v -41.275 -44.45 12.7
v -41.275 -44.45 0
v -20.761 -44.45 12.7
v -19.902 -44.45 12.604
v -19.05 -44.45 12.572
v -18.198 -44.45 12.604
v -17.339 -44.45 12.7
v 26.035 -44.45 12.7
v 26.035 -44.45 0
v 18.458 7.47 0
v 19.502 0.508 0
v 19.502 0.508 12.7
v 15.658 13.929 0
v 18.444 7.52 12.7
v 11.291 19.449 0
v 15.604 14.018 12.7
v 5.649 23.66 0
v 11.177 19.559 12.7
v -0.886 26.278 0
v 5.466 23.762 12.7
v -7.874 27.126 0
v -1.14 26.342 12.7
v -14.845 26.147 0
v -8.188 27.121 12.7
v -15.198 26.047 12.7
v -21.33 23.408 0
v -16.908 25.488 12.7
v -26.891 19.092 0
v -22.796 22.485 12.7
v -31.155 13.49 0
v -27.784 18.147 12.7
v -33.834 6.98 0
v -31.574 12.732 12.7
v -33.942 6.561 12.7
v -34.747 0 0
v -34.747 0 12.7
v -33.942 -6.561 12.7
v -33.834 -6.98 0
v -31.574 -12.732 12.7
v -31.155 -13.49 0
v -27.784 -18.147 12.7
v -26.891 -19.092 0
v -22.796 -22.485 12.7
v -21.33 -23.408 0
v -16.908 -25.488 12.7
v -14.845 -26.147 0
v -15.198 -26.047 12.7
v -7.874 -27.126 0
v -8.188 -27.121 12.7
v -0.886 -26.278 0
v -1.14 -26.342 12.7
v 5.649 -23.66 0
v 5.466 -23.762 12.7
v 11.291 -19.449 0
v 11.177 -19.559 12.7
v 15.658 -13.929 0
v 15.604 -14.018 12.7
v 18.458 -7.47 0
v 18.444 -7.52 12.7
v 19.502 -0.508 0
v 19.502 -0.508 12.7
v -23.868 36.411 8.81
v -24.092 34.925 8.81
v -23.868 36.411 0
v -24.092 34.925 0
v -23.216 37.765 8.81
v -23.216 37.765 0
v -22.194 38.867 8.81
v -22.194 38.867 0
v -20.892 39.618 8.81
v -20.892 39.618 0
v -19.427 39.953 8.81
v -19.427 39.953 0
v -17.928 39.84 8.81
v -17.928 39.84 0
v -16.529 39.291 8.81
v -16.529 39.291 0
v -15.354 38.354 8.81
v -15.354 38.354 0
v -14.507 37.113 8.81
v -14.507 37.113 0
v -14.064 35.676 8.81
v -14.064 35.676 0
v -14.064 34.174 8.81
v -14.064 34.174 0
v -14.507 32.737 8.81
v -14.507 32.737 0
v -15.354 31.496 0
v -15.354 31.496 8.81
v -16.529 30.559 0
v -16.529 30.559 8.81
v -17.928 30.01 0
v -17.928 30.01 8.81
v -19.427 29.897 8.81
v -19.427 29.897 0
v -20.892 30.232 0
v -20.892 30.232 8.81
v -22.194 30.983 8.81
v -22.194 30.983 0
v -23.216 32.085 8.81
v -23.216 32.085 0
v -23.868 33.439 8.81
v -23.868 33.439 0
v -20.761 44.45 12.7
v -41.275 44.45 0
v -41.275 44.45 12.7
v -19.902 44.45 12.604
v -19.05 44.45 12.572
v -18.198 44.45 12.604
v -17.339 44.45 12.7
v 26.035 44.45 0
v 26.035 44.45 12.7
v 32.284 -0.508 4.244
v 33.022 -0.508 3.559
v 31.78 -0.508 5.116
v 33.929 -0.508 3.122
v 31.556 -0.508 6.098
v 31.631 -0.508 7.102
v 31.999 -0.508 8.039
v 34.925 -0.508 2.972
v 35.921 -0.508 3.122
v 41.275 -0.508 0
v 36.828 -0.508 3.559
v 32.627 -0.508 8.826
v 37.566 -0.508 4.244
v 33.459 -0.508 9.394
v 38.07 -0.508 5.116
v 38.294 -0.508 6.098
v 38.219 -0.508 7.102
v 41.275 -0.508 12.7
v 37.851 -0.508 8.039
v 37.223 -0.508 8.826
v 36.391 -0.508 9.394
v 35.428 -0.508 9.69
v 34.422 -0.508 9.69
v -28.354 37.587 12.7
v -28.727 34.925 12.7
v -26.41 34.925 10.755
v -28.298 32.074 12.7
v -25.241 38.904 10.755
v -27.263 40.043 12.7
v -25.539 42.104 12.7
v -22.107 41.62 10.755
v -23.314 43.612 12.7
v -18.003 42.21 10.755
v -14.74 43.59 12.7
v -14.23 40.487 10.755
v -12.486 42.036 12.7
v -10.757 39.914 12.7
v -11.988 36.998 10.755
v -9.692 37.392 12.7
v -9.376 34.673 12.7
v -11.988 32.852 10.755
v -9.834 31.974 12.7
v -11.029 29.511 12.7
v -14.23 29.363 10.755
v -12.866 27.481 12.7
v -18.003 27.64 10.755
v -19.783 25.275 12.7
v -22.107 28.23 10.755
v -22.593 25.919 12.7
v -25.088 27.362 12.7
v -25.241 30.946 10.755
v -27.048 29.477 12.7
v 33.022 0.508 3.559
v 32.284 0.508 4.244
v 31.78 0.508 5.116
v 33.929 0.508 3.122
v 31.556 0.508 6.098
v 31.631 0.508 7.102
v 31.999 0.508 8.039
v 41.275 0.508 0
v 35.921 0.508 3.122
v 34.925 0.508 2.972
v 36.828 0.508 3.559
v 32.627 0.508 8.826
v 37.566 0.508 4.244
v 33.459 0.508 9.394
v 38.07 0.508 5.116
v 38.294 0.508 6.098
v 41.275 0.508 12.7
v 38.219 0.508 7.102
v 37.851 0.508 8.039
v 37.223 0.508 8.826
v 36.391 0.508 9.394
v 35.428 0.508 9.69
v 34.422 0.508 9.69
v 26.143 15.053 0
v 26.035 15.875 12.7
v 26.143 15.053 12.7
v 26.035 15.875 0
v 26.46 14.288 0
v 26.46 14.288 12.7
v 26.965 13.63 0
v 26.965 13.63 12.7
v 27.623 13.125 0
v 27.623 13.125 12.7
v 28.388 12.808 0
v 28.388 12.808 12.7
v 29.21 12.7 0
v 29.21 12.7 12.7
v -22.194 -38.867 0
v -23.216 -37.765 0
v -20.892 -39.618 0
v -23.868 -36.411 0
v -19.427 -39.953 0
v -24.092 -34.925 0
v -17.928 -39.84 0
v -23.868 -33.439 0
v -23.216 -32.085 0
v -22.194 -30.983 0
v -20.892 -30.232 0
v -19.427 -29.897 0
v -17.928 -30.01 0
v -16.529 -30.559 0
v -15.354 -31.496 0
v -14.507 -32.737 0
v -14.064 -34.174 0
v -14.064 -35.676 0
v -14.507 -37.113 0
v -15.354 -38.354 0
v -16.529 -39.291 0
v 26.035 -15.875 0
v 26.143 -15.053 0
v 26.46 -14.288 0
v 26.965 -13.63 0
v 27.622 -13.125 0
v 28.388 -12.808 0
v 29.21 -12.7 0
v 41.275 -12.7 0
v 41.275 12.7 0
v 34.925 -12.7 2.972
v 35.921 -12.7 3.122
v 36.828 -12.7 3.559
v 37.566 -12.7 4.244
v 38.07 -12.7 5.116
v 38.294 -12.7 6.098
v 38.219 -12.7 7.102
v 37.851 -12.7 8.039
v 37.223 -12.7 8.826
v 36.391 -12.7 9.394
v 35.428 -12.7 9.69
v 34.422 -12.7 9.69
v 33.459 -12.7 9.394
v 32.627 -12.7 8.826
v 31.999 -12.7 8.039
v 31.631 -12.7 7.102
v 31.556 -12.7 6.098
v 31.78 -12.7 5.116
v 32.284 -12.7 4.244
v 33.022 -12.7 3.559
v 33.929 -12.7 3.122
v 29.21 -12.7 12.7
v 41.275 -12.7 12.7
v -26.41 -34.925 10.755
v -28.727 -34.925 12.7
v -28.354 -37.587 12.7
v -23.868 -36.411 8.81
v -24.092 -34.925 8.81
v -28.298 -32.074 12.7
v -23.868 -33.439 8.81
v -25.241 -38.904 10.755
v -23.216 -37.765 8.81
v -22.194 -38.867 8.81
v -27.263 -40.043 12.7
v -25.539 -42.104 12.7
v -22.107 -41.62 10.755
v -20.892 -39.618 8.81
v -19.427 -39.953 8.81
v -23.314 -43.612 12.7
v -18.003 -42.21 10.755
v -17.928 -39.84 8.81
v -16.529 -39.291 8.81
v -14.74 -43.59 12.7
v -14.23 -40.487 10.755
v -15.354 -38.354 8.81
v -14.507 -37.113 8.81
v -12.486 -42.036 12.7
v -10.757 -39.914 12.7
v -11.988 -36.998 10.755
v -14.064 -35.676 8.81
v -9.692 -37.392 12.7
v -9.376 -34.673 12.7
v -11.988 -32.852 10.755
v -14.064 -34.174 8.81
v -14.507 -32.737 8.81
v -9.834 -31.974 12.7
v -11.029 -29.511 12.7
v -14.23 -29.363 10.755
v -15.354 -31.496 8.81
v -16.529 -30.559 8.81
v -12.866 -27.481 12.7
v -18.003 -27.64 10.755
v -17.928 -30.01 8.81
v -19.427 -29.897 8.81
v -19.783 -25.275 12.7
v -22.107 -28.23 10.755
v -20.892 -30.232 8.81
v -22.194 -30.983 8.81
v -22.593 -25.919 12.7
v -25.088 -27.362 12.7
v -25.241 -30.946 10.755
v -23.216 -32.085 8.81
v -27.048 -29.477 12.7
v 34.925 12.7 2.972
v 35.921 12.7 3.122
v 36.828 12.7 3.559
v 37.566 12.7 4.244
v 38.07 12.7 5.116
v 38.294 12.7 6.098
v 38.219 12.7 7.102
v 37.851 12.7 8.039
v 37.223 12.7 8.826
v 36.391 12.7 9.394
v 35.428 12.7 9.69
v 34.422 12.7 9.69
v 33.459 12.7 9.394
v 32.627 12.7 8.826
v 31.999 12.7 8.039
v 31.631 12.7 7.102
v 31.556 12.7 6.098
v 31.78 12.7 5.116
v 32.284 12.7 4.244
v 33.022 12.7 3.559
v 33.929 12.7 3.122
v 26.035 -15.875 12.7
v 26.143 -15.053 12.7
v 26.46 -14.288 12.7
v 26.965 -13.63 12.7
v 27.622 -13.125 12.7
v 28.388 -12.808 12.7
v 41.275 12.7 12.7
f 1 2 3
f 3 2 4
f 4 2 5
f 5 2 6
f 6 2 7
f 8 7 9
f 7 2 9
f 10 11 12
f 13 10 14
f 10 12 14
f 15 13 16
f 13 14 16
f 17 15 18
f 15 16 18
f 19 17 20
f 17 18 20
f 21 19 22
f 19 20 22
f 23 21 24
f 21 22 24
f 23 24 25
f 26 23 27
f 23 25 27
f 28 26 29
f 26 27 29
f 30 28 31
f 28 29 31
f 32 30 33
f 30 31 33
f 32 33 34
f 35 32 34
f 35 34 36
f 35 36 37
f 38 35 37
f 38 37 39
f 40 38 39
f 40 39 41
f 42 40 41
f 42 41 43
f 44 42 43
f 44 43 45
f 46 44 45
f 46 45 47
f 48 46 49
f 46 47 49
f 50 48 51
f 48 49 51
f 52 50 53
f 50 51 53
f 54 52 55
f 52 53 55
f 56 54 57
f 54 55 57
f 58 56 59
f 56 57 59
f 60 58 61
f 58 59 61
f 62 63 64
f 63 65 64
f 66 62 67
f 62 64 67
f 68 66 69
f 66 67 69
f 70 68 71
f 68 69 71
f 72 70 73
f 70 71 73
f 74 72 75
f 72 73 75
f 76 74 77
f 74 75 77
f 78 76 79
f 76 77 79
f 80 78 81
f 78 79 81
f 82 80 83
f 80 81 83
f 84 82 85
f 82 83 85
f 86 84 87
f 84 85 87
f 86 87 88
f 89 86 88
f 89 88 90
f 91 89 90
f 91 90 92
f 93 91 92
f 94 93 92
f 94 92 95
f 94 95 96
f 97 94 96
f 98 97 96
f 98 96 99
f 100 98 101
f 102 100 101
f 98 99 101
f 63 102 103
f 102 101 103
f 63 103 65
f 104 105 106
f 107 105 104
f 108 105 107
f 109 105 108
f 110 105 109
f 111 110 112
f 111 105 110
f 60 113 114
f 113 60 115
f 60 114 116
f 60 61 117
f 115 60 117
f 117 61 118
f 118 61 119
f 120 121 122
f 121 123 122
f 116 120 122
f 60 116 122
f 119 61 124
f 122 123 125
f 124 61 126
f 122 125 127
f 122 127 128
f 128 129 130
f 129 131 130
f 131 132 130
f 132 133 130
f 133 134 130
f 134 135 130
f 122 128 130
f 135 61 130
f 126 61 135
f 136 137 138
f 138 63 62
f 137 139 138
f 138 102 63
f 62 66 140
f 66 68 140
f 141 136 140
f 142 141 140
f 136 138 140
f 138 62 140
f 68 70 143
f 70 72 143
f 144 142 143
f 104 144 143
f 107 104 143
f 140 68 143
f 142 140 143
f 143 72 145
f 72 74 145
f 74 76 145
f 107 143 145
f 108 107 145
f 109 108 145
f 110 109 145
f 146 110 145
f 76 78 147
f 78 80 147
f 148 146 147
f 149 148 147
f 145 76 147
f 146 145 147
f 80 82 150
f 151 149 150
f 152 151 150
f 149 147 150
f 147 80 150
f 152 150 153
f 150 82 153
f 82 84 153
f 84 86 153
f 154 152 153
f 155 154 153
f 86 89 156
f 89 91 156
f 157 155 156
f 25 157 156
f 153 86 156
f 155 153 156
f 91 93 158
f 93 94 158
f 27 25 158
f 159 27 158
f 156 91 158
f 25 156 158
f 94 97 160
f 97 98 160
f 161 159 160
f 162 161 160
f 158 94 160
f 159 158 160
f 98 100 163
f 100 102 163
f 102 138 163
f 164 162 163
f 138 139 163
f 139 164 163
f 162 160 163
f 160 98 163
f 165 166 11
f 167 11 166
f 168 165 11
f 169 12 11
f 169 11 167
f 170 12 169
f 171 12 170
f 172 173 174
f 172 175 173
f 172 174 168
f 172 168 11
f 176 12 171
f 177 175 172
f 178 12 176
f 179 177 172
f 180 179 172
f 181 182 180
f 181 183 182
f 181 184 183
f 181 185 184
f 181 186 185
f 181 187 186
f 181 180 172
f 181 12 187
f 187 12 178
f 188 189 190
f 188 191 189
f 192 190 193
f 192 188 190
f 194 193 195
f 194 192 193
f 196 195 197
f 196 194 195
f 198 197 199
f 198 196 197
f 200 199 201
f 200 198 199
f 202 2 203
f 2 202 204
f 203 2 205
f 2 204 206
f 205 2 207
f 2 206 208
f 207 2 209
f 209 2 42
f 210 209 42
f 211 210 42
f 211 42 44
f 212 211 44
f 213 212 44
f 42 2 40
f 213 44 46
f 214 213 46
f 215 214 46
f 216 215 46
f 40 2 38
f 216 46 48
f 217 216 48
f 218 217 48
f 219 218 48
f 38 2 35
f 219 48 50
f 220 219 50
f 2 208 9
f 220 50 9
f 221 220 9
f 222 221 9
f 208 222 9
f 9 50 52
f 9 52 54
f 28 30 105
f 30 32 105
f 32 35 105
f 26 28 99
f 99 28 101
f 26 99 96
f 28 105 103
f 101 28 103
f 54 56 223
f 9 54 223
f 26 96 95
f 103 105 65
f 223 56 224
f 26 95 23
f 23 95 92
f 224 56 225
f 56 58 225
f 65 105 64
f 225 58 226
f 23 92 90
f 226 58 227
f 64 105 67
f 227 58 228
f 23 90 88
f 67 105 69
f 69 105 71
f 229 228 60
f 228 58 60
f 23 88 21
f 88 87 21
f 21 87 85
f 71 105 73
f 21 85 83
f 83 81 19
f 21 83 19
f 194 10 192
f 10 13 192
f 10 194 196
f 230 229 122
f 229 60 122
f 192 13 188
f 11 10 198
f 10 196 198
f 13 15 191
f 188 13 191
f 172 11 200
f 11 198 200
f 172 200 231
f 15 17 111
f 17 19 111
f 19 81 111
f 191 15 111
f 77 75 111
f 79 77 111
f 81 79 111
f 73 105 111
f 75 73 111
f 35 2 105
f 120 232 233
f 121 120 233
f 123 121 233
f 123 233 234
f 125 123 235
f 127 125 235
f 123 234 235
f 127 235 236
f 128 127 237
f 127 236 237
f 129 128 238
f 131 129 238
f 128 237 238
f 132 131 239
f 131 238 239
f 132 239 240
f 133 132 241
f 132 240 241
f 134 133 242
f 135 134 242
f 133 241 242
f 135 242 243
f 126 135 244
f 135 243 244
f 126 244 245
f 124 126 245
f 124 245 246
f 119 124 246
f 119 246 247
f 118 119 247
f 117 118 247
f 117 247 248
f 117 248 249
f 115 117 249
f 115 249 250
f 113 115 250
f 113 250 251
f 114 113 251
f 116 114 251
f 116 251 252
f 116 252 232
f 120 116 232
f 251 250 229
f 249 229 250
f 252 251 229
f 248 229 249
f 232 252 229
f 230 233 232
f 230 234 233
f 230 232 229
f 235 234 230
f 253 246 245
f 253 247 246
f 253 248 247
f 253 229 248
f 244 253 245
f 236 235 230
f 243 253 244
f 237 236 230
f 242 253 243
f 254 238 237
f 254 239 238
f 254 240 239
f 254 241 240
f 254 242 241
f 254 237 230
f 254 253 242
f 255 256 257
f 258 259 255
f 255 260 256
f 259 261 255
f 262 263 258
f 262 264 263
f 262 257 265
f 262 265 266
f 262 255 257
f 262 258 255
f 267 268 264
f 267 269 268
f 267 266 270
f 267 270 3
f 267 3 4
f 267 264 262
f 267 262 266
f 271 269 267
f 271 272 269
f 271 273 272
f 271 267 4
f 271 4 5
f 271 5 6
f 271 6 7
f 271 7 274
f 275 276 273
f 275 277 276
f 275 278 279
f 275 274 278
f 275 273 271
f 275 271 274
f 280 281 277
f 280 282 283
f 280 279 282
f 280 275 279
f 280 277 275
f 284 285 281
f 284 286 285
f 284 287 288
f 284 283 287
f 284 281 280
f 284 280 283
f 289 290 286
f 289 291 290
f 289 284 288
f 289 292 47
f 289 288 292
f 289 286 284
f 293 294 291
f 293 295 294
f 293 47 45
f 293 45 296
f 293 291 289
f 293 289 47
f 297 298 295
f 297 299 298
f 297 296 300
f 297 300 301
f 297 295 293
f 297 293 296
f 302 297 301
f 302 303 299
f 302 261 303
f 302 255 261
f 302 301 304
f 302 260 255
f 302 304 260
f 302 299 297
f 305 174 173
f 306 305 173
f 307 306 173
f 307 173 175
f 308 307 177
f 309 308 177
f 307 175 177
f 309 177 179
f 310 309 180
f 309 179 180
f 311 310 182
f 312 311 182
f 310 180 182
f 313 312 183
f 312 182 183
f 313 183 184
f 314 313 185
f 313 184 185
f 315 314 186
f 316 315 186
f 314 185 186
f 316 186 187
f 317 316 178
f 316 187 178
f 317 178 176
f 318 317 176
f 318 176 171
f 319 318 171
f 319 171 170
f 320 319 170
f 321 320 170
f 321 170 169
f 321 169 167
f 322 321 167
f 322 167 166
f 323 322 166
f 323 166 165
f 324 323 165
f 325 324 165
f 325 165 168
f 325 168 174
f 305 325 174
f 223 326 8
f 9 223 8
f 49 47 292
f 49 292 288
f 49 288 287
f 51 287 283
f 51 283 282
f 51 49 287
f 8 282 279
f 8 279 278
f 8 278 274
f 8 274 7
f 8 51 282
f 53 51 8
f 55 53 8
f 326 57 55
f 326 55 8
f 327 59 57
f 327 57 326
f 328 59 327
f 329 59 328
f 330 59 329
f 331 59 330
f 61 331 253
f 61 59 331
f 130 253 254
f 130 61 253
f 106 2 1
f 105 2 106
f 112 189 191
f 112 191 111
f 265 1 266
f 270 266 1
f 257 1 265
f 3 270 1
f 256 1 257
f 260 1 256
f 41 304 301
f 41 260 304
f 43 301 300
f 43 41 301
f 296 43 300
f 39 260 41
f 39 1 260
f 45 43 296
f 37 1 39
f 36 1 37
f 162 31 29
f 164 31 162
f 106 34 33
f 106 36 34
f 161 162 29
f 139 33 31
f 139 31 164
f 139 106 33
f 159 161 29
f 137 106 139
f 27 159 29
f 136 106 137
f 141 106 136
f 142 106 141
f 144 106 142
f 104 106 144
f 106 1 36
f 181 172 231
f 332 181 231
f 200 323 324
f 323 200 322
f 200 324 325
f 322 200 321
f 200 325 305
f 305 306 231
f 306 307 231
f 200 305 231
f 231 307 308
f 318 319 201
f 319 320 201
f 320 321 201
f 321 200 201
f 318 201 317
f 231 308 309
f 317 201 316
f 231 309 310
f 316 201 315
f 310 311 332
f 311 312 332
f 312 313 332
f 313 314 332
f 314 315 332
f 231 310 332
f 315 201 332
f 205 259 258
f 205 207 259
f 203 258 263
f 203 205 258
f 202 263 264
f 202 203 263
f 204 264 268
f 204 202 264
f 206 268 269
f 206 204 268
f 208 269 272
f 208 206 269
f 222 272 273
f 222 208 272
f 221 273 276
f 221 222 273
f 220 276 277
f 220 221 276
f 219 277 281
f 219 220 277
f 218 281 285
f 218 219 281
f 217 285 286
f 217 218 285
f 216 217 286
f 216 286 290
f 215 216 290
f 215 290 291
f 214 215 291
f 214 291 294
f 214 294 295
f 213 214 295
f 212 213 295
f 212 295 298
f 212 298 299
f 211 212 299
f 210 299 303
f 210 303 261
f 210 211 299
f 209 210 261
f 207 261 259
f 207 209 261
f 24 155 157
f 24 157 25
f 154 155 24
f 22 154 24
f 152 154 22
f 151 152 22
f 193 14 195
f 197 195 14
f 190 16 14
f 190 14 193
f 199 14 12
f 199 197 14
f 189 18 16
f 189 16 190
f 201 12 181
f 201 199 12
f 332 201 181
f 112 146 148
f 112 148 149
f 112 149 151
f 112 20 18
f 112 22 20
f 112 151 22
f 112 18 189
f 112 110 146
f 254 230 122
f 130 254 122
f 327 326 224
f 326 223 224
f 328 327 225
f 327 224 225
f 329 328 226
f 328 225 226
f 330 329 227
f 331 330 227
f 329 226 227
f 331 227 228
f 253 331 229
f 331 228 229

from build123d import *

# Parameters (mm, degrees)
SKETCH1_W                                           = 82.55
SKETCH1_H                                           = 88.9
EXTRUDE1_DEPTH                                      = 12.7
SKETCH2_R                                           = 27.1272
EXTRUDE2_DEPTH                                      = 13.7
SKETCH3_W                                           = 28.468633454
SKETCH3_H                                           = 1.016
EXTRUDE3_DEPTH                                      = 13.7
F_1_4_CLEARANCE_HOLE1_D                             = 6.7564
CSK_FOR_3_8_FLAT_HEAD_MACHINE_SCREW_100_D           = 10.0838
CSK_FOR_3_8_FLAT_HEAD_MACHINE_SCREW_100_CSINK_D     = 19.3548
CSK_FOR_3_8_FLAT_HEAD_MACHINE_SCREW_100_CSINK_ANGLE = 100
SKETCH10_W                                          = 15.24
SKETCH10_H                                          = 31.75
EXTRUDE4_DEPTH                                      = 13.7000001
FILLET1_R                                           = 3.175


with BuildPart() as part:
    # Sketch1 → Extrude1 (new body)
    with BuildSketch(Plane.XY):
        Rectangle(SKETCH1_W, SKETCH1_H)
    extrude(amount=EXTRUDE1_DEPTH)

    # Sketch2 → Extrude2 (cut, through all)
    with BuildSketch(Plane.XY.offset(12.7)):
        with Locations((-7.62, 0)):
            Circle(SKETCH2_R)
    extrude(amount=-EXTRUDE2_DEPTH, mode=Mode.SUBTRACT)

    # Sketch3 → Extrude3 (cut, through all)
    with BuildSketch(Plane.XY.offset(12.7)):
        with Locations((30.3911, 0)):
            Rectangle(SKETCH3_W, SKETCH3_H)
    extrude(amount=-EXTRUDE3_DEPTH, mode=Mode.SUBTRACT)

    # 1/4 Clearance Hole1 (through all)
    with Locations(Plane(origin=(34.925, 44.45, 6.35), x_dir=(0, 0, 1), z_dir=(0, 1, 0))):
        with Locations((0, 0)):
            Hole(F_1_4_CLEARANCE_HOLE1_D / 2)

    # CSK for 3/8 Flat Head Machine Screw (100)1 (through all)
    with Locations(Plane(origin=(-19.05, 34.925, 12.7), x_dir=(1, 0, 0), z_dir=(0, 0, 1))):
        with Locations((0, 0)):
            csk_for_3_8_flat_head_machine_screw_100 = CounterSinkHole(CSK_FOR_3_8_FLAT_HEAD_MACHINE_SCREW_100_D / 2, CSK_FOR_3_8_FLAT_HEAD_MACHINE_SCREW_100_CSINK_D / 2, counter_sink_angle=CSK_FOR_3_8_FLAT_HEAD_MACHINE_SCREW_100_CSINK_ANGLE)

    # Mirror1: CSK for 3/8 Flat Head Machine Screw (100)1 across plane
    add(csk_for_3_8_flat_head_machine_screw_100.mirror(Plane.ZX), mode=Mode.SUBTRACT)

    # Sketch10 → Extrude4 (cut, through all)
    with BuildSketch(Plane.XY.offset(12.7)):
        with Locations((33.655, 28.575)):
            Rectangle(SKETCH10_W, SKETCH10_H)
    extrude4 = extrude(amount=-EXTRUDE4_DEPTH, mode=Mode.SUBTRACT)

    # Mirror2: Extrude4 across plane
    add(extrude4.mirror(Plane.ZX), mode=Mode.SUBTRACT)

    # Fillet1
    fillet1_edges = [part.edges().sort_by_distance(p)[0] for p in [
        (26.035, 12.7, 6.35),
        (26.035, -12.7, 6.35),
    ]]
    fillet(fillet1_edges, radius=FILLET1_R)


solid = part.part
